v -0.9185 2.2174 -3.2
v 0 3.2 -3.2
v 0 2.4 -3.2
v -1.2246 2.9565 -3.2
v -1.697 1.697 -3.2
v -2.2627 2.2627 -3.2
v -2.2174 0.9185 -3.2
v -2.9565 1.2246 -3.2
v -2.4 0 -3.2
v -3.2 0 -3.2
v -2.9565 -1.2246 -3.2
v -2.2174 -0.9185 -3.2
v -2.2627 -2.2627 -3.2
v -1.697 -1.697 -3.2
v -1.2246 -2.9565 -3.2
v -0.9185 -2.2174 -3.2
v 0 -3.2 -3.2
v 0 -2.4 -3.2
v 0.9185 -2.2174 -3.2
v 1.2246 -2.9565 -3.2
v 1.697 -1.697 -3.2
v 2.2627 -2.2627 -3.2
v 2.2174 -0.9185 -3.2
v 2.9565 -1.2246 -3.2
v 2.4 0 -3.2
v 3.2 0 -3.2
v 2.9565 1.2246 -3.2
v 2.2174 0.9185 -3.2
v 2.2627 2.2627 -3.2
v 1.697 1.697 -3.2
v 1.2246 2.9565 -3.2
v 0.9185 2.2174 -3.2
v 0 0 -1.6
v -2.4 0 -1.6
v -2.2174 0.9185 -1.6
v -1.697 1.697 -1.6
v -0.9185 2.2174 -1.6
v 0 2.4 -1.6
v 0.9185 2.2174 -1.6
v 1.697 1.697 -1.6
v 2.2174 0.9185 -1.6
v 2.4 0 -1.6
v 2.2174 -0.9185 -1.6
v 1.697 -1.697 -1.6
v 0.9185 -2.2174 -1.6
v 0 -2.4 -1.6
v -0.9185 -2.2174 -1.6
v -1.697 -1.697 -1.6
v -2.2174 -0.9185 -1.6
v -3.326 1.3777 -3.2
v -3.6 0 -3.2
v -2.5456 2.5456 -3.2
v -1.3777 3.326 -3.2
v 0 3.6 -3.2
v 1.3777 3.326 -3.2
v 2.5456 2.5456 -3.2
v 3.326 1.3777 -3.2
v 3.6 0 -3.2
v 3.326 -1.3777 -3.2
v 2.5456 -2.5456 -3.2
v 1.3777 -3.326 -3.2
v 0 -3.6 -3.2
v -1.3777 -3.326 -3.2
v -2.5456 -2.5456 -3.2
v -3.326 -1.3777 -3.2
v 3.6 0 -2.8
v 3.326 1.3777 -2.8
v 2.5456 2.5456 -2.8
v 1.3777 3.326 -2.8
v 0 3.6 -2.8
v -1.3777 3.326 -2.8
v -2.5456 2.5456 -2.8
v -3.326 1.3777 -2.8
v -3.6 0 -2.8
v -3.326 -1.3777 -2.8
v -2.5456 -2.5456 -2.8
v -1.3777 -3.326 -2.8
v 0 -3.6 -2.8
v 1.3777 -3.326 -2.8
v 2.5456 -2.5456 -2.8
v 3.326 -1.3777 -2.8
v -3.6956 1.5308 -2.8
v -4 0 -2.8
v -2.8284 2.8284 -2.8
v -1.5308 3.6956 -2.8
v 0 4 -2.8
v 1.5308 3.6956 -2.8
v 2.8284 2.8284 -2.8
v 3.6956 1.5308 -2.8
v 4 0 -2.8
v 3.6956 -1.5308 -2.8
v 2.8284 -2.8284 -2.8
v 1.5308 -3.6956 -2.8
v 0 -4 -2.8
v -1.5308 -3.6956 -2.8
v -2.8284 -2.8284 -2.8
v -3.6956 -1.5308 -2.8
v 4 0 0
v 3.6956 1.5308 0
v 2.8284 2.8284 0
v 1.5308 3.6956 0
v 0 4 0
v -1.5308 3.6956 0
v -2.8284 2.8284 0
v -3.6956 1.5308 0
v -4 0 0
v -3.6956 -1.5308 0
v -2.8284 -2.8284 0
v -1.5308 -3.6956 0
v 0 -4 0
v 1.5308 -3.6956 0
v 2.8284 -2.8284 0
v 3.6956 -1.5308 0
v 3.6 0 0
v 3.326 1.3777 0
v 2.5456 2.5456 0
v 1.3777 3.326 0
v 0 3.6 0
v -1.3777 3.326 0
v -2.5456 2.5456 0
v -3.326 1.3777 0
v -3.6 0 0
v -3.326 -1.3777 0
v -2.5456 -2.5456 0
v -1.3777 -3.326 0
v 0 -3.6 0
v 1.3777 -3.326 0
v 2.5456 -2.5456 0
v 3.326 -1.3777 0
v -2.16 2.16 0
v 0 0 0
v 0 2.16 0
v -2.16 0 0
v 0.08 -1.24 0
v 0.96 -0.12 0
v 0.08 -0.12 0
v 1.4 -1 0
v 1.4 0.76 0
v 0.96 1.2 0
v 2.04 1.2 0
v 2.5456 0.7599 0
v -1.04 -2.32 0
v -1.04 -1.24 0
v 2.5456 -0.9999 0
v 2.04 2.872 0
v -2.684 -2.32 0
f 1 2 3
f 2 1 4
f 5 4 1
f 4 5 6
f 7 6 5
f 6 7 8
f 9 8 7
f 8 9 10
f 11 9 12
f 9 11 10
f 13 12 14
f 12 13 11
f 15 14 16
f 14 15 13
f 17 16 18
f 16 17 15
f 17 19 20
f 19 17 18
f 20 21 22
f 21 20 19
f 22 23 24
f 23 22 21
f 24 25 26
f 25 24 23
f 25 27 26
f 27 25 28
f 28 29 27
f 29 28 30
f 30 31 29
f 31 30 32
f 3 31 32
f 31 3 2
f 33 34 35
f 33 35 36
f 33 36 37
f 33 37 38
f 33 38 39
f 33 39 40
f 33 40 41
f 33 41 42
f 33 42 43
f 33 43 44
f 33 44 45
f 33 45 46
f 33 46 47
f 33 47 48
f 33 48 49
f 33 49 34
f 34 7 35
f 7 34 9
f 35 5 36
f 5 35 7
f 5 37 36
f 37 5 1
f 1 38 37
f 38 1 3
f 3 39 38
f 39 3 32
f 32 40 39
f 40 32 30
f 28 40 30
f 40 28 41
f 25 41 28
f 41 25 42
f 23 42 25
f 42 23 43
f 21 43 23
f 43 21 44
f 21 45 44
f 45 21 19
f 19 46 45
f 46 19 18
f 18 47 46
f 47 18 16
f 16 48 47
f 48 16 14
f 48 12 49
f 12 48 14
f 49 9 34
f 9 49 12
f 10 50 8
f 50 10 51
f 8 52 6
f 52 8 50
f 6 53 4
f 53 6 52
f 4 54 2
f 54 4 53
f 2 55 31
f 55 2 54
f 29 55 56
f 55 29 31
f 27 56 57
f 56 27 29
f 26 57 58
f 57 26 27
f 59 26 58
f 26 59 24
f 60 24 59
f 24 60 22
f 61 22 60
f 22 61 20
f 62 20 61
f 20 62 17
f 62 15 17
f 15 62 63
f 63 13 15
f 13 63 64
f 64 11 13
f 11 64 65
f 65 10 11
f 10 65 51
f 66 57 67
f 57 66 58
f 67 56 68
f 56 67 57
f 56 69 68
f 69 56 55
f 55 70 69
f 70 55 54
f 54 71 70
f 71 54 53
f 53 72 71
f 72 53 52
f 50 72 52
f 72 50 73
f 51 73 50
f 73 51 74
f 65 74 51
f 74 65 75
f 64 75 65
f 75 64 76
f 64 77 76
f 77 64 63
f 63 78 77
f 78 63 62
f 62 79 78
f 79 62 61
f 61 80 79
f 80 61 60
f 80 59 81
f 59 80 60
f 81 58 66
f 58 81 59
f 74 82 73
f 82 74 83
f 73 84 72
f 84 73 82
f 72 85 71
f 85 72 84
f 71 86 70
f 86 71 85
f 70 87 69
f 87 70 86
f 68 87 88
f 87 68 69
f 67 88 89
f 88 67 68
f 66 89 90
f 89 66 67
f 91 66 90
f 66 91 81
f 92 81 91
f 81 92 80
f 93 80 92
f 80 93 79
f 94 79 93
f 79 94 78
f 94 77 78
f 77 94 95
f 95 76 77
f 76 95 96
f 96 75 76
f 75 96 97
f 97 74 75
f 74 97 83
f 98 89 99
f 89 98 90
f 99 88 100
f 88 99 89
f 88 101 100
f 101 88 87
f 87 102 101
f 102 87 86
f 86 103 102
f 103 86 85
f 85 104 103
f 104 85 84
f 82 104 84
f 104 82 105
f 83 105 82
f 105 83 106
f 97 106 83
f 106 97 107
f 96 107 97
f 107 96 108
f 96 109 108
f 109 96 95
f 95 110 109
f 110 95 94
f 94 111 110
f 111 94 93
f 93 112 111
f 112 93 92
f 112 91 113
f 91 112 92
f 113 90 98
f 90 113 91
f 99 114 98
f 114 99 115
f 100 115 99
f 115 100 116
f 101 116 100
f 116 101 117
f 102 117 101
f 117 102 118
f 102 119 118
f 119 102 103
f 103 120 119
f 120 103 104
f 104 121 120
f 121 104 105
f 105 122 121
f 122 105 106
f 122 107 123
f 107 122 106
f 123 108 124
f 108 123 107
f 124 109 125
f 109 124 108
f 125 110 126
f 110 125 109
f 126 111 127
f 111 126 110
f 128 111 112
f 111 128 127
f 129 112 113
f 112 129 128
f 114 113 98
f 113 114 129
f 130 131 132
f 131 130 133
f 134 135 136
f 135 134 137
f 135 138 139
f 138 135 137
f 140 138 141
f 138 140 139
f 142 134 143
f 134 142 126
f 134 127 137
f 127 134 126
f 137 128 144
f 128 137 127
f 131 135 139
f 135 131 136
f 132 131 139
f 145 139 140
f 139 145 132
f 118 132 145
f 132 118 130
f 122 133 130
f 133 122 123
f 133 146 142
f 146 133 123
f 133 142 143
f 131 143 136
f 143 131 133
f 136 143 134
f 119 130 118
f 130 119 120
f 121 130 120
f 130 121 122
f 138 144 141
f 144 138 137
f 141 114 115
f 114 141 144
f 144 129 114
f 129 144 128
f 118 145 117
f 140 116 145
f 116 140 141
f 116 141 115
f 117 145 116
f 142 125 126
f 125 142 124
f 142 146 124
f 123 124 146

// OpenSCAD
// file: ../p/4-4disc.scad
use <../lib.scad>
function ldraw_lib__4_4disc() = [
// 0 Disc 1.0
// 0 Name: 4-4disc.dat
// 0 Author: James Jessiman
// 0 !LDRAW_ORG Primitive UPDATE 2002-02
// 0 !LICENSE Licensed under CC BY 4.0 : see CAreadme.txt
// 
// 0 BFC CERTIFY CCW
  [0,"BFC","CERTIFY"],
  [0,"BFC","CCW"],
// 
// 0 !HISTORY 1998-12-15 [PTadmin] Official Update 1998-10
// 0 !HISTORY 2002-03-23 [sbliss] Added BFC statement
// 0 !HISTORY 2002-04-25 [PTadmin] Official Update 2002-02
// 0 !HISTORY 2007-06-24 [PTadmin] Header formatted for Contributor Agreement
// 0 !HISTORY 2008-07-01 [PTadmin] Official Update 2008-01
// 
// 
// 3 16 0 0 0 1 0 0 0.9239 0 0.3827
  [3,16,0,0,0,1,0,0,0.9239,0,0.3827],
// 3 16 0 0 0 0.9239 0 0.3827 0.7071 0 0.7071
  [3,16,0,0,0,0.9239,0,0.3827,0.7071,0,0.7071],
// 3 16 0 0 0 0.7071 0 0.7071 0.3827 0 0.9239
  [3,16,0,0,0,0.7071,0,0.7071,0.3827,0,0.9239],
// 3 16 0 0 0 0.3827 0 0.9239 0 0 1
  [3,16,0,0,0,0.3827,0,0.9239,0,0,1],
// 3 16 0 0 0 0 0 1 -0.3827 0 0.9239
  [3,16,0,0,0,0,0,1,-0.3827,0,0.9239],
// 3 16 0 0 0 -0.3827 0 0.9239 -0.7071 0 0.7071
  [3,16,0,0,0,-0.3827,0,0.9239,-0.7071,0,0.7071],
// 3 16 0 0 0 -0.7071 0 0.7071 -0.9239 0 0.3827
  [3,16,0,0,0,-0.7071,0,0.7071,-0.9239,0,0.3827],
// 3 16 0 0 0 -0.9239 0 0.3827 -1 0 -0
  [3,16,0,0,0,-0.9239,0,0.3827,-1,0,-0],
// 3 16 0 0 0 -1 0 -0 -0.9239 0 -0.3827
  [3,16,0,0,0,-1,0,-0,-0.9239,0,-0.3827],
// 3 16 0 0 0 -0.9239 0 -0.3827 -0.7071 0 -0.7071
  [3,16,0,0,0,-0.9239,0,-0.3827,-0.7071,0,-0.7071],
// 3 16 0 0 0 -0.7071 0 -0.7071 -0.3827 0 -0.9239
  [3,16,0,0,0,-0.7071,0,-0.7071,-0.3827,0,-0.9239],
// 3 16 0 0 0 -0.3827 0 -0.9239 0 0 -1
  [3,16,0,0,0,-0.3827,0,-0.9239,0,0,-1],
// 3 16 0 0 0 0 0 -1 0.3827 0 -0.9239
  [3,16,0,0,0,0,0,-1,0.3827,0,-0.9239],
// 3 16 0 0 0 0.3827 0 -0.9239 0.7071 0 -0.7071
  [3,16,0,0,0,0.3827,0,-0.9239,0.7071,0,-0.7071],
// 3 16 0 0 0 0.7071 0 -0.7071 0.9239 0 -0.3827
  [3,16,0,0,0,0.7071,0,-0.7071,0.9239,0,-0.3827],
// 3 16 0 0 0 0.9239 0 -0.3827 1 0 0
  [3,16,0,0,0,0.9239,0,-0.3827,1,0,0],
// 0
];
module ldraw_lib__4_4disc(step=0, col=false, unit=2/5, alt=false, line=0.2, solid=!$preview)
    makepoly(ldraw_lib__4_4disc(), step=step, col=col, unit=unit, alt=alt, line=line, solid=solid);
ldraw_lib__4_4disc(line=0.2);
// file: ../p/4-4ring3.scad
use <../lib.scad>
function ldraw_lib__4_4ring3() = [
// 0 Ring  3 x 1.0
// 0 Name: 4-4ring3.dat
// 0 Author: James Jessiman
// 0 !LDRAW_ORG Primitive UPDATE 2009-01
// 0 !LICENSE Licensed under CC BY 2.0 and CC BY 4.0 : see CAreadme.txt
// 
// 0 BFC CERTIFY CCW
  [0,"BFC","CERTIFY"],
  [0,"BFC","CCW"],
// 
// 0 !HISTORY 1998-12-15 [PTadmin] Official Update 1998-10
// 0 !HISTORY 2002-04-05 [hafhead] Added BFC statement
// 0 !HISTORY 2002-04-25 [PTadmin] Official Update 2002-02
// 0 !HISTORY 2007-06-24 [PTadmin] Header formatted for Contributor Agreement
// 0 !HISTORY 2008-07-01 [PTadmin] Official Update 2008-01
// 0 !HISTORY 2008-08-26 [cwdee] Switch polygon winding and rename
// 0 !HISTORY 2009-05-02 [PTadmin] Official Update 2009-01
// 
// 
// 4 16 -1.5308 0 3.6956 -1.1481 0 2.7717 0 0 3 0 0 4
  [4,16,-1.5308,0,3.6956,-1.1481,0,2.7717,0,0,3,0,0,4],
// 4 16 -2.8284 0 2.8284 -2.1213 0 2.1213 -1.1481 0 2.7717 -1.5308 0 3.6956
  [4,16,-2.8284,0,2.8284,-2.1213,0,2.1213,-1.1481,0,2.7717,-1.5308,0,3.6956],
// 4 16 -3.6956 0 1.5308 -2.7717 0 1.1481 -2.1213 0 2.1213 -2.8284 0 2.8284
  [4,16,-3.6956,0,1.5308,-2.7717,0,1.1481,-2.1213,0,2.1213,-2.8284,0,2.8284],
// 4 16 -4 0 0 -3 0 0 -2.7717 0 1.1481 -3.6956 0 1.5308
  [4,16,-4,0,0,-3,0,0,-2.7717,0,1.1481,-3.6956,0,1.5308],
// 4 16 -3.6956 0 -1.5308 -2.7717 0 -1.1481 -3 0 0 -4 0 0
  [4,16,-3.6956,0,-1.5308,-2.7717,0,-1.1481,-3,0,0,-4,0,0],
// 4 16 -2.8284 0 -2.8284 -2.1213 0 -2.1213 -2.7717 0 -1.1481 -3.6956 0 -1.5308
  [4,16,-2.8284,0,-2.8284,-2.1213,0,-2.1213,-2.7717,0,-1.1481,-3.6956,0,-1.5308],
// 4 16 -1.5308 0 -3.6956 -1.1481 0 -2.7717 -2.1213 0 -2.1213 -2.8284 0 -2.8284
  [4,16,-1.5308,0,-3.6956,-1.1481,0,-2.7717,-2.1213,0,-2.1213,-2.8284,0,-2.8284],
// 4 16 0 0 -4 0 0 -3 -1.1481 0 -2.7717 -1.5308 0 -3.6956
  [4,16,0,0,-4,0,0,-3,-1.1481,0,-2.7717,-1.5308,0,-3.6956],
// 4 16 1.5308 0 -3.6956 1.1481 0 -2.7717 0 0 -3 0 0 -4
  [4,16,1.5308,0,-3.6956,1.1481,0,-2.7717,0,0,-3,0,0,-4],
// 4 16 2.8284 0 -2.8284 2.1213 0 -2.1213 1.1481 0 -2.7717 1.5308 0 -3.6956
  [4,16,2.8284,0,-2.8284,2.1213,0,-2.1213,1.1481,0,-2.7717,1.5308,0,-3.6956],
// 4 16 3.6956 0 -1.5308 2.7717 0 -1.1481 2.1213 0 -2.1213 2.8284 0 -2.8284
  [4,16,3.6956,0,-1.5308,2.7717,0,-1.1481,2.1213,0,-2.1213,2.8284,0,-2.8284],
// 4 16 4 0 0 3 0 0 2.7717 0 -1.1481 3.6956 0 -1.5308
  [4,16,4,0,0,3,0,0,2.7717,0,-1.1481,3.6956,0,-1.5308],
// 4 16 3.6956 0 1.5308 2.7717 0 1.1481 3 0 0 4 0 0
  [4,16,3.6956,0,1.5308,2.7717,0,1.1481,3,0,0,4,0,0],
// 4 16 2.8284 0 2.8284 2.1213 0 2.1213 2.7717 0 1.1481 3.6956 0 1.5308
  [4,16,2.8284,0,2.8284,2.1213,0,2.1213,2.7717,0,1.1481,3.6956,0,1.5308],
// 4 16 1.5308 0 3.6956 1.1481 0 2.7717 2.1213 0 2.1213 2.8284 0 2.8284
  [4,16,1.5308,0,3.6956,1.1481,0,2.7717,2.1213,0,2.1213,2.8284,0,2.8284],
// 4 16 0 0 4 0 0 3 1.1481 0 2.7717 1.5308 0 3.6956
  [4,16,0,0,4,0,0,3,1.1481,0,2.7717,1.5308,0,3.6956],
// 0
];
module ldraw_lib__4_4ring3(step=0, col=false, unit=2/5, alt=false, line=0.2, solid=!$preview)
    makepoly(ldraw_lib__4_4ring3(), step=step, col=col, unit=unit, alt=alt, line=line, solid=solid);
ldraw_lib__4_4ring3(line=0.2);
// file: ../p/4-4cylc.scad
use <../lib.scad>
use <4-4cyli.scad>
use <4-4disc.scad>
use <4-4edge.scad>
function ldraw_lib__4_4cylc() = [
// 0 Cylinder Closed 1.0
// 0 Name: 4-4cylc.dat
// 0 Author: Alex Taylor [anathema]
// 0 !LDRAW_ORG Primitive UPDATE 2009-02
// 0 !LICENSE Licensed under CC BY 2.0 and CC BY 4.0 : see CAreadme.txt
// 
// 0 BFC CERTIFY CCW
  [0,"BFC","CERTIFY"],
  [0,"BFC","CCW"],
// 
// 0 !HISTORY 2008-12-29 [cwdee] Removed one disc
// 0 !HISTORY 2009-09-03 [PTadmin] Official Update 2009-02
// 
// 
// 1 16 0 0 0 1 0 0 0 1 0 0 0 1 4-4edge.dat
  [1,16,0,0,0,1,0,0,0,1,0,0,0,1, ldraw_lib__4_4edge()],
// 1 16 0 1 0 1 0 0 0 1 0 0 0 1 4-4edge.dat
  [1,16,0,1,0,1,0,0,0,1,0,0,0,1, ldraw_lib__4_4edge()],
// 1 16 0 0 0 1 0 0 0 1 0 0 0 1 4-4disc.dat
  [1,16,0,0,0,1,0,0,0,1,0,0,0,1, ldraw_lib__4_4disc()],
// 1 16 0 0 0 1 0 0 0 1 0 0 0 1 4-4cyli.dat
  [1,16,0,0,0,1,0,0,0,1,0,0,0,1, ldraw_lib__4_4cyli()],
// 0
];
module ldraw_lib__4_4cylc(step=0, col=false, unit=2/5, alt=false, line=0.2, solid=!$preview)
    makepoly(ldraw_lib__4_4cylc(), step=step, col=col, unit=unit, alt=alt, line=line, solid=solid);
ldraw_lib__4_4cylc(line=0.2);
// file: ../p/4-4edge.scad
use <../lib.scad>
function ldraw_lib__4_4edge() = [
// 0 Circle 1.0
// 0 Name: 4-4edge.dat
// 0 Author: James Jessiman
// 0 !LDRAW_ORG Primitive UPDATE 2017-01
// 0 !LICENSE Licensed under CC BY 4.0 : see CAreadme.txt
// 
// 0 BFC CERTIFY CCW
  [0,"BFC","CERTIFY"],
  [0,"BFC","CCW"],
// 
// 0 !HISTORY 1998-12-15 [PTadmin] Official Update 1998-10
// 0 !HISTORY 2005-12-28 [PTadmin] Official Update 2005-01
// 0 !HISTORY 2007-06-24 [PTadmin] Header formatted for Contributor Agreement
// 0 !HISTORY 2008-07-01 [PTadmin] Official Update 2008-01
// 0 !HISTORY 2017-01-15 [Steffen] BFCed
// 0 !HISTORY 2017-12-30 [PTadmin] Official Update 2017-01
// 
// 
// 2 24 1 0 0 0.9239 0 0.3827
  [2,24,1,0,0,0.9239,0,0.3827],
// 2 24 0.9239 0 0.3827 0.7071 0 0.7071
  [2,24,0.9239,0,0.3827,0.7071,0,0.7071],
// 2 24 0.7071 0 0.7071 0.3827 0 0.9239
  [2,24,0.7071,0,0.7071,0.3827,0,0.9239],
// 2 24 0.3827 0 0.9239 0 0 1
  [2,24,0.3827,0,0.9239,0,0,1],
// 2 24 0 0 1 -0.3827 0 0.9239
  [2,24,0,0,1,-0.3827,0,0.9239],
// 2 24 -0.3827 0 0.9239 -0.7071 0 0.7071
  [2,24,-0.3827,0,0.9239,-0.7071,0,0.7071],
// 2 24 -0.7071 0 0.7071 -0.9239 0 0.3827
  [2,24,-0.7071,0,0.7071,-0.9239,0,0.3827],
// 2 24 -0.9239 0 0.3827 -1 0 -0
  [2,24,-0.9239,0,0.3827,-1,0,-0],
// 2 24 -1 0 -0 -0.9239 0 -0.3827
  [2,24,-1,0,-0,-0.9239,0,-0.3827],
// 2 24 -0.9239 0 -0.3827 -0.7071 0 -0.7071
  [2,24,-0.9239,0,-0.3827,-0.7071,0,-0.7071],
// 2 24 -0.7071 0 -0.7071 -0.3827 0 -0.9239
  [2,24,-0.7071,0,-0.7071,-0.3827,0,-0.9239],
// 2 24 -0.3827 0 -0.9239 0 0 -1
  [2,24,-0.3827,0,-0.9239,0,0,-1],
// 2 24 0 0 -1 0.3827 0 -0.9239
  [2,24,0,0,-1,0.3827,0,-0.9239],
// 2 24 0.3827 0 -0.9239 0.7071 0 -0.7071
  [2,24,0.3827,0,-0.9239,0.7071,0,-0.7071],
// 2 24 0.7071 0 -0.7071 0.9239 0 -0.3827
  [2,24,0.7071,0,-0.7071,0.9239,0,-0.3827],
// 2 24 0.9239 0 -0.3827 1 0 0
  [2,24,0.9239,0,-0.3827,1,0,0],
];
module ldraw_lib__4_4edge(step=0, col=false, unit=2/5, alt=false, line=0.2, solid=!$preview)
    makepoly(ldraw_lib__4_4edge(), step=step, col=col, unit=unit, alt=alt, line=line, solid=solid);
ldraw_lib__4_4edge(line=0.2);
// file: ../p/4-4cyli.scad
use <../lib.scad>
function ldraw_lib__4_4cyli() = [
// 0 Cylinder 1.0
// 0 Name: 4-4cyli.dat
// 0 Author: James Jessiman
// 0 !LDRAW_ORG Primitive UPDATE 2005-01
// 0 !LICENSE Licensed under CC BY 2.0 and CC BY 4.0 : see CAreadme.txt
// 
// 0 BFC CERTIFY CCW
  [0,"BFC","CERTIFY"],
  [0,"BFC","CCW"],
// 
// 0 !HISTORY 1998-12-15 [PTadmin] Official Update 1998-10
// 0 !HISTORY 2002-03-23 [sbliss] Added BFC statement; merged headers from files in distributions LDraw 0.27 and Complete.
// 0 !HISTORY 2002-04-25 [PTadmin] Official Update 2002-02
// 0 !HISTORY 2004-12-14 [guyvivan] BFC CCW
// 0 !HISTORY 2005-12-28 [PTadmin] Official Update 2005-01
// 0 !HISTORY 2007-06-24 [PTadmin] Header formatted for Contributor Agreement
// 0 !HISTORY 2008-07-01 [PTadmin] Official Update 2008-01
// 
// 
// 4 16 1 1 0 0.9239 1 0.3827 0.9239 0 0.3827 1 0 0
  [4,16,1,1,0,0.9239,1,0.3827,0.9239,0,0.3827,1,0,0],
// 5 24 1 0 0 1 1 0 0.9239 0 0.3827 0.9239 0 -0.3827
  [5,24,1,0,0,1,1,0,0.9239,0,0.3827,0.9239,0,-0.3827],
// 4 16 0.9239 1 0.3827 0.7071 1 0.7071 0.7071 0 0.7071 0.9239 0 0.3827
  [4,16,0.9239,1,0.3827,0.7071,1,0.7071,0.7071,0,0.7071,0.9239,0,0.3827],
// 5 24 0.9239 0 0.3827 0.9239 1 0.3827 0.7071 0 0.7071 1 0 0
  [5,24,0.9239,0,0.3827,0.9239,1,0.3827,0.7071,0,0.7071,1,0,0],
// 4 16 0.7071 1 0.7071 0.3827 1 0.9239 0.3827 0 0.9239 0.7071 0 0.7071
  [4,16,0.7071,1,0.7071,0.3827,1,0.9239,0.3827,0,0.9239,0.7071,0,0.7071],
// 5 24 0.7071 0 0.7071 0.7071 1 0.7071 0.3827 0 0.9239 0.9239 0 0.3827
  [5,24,0.7071,0,0.7071,0.7071,1,0.7071,0.3827,0,0.9239,0.9239,0,0.3827],
// 4 16 0.3827 1 0.9239 0 1 1 0 0 1 0.3827 0 0.9239
  [4,16,0.3827,1,0.9239,0,1,1,0,0,1,0.3827,0,0.9239],
// 5 24 0.3827 0 0.9239 0.3827 1 0.9239 0 0 1 0.7071 0 0.7071
  [5,24,0.3827,0,0.9239,0.3827,1,0.9239,0,0,1,0.7071,0,0.7071],
// 4 16 0 1 1 -0.3827 1 0.9239 -0.3827 0 0.9239 0 0 1
  [4,16,0,1,1,-0.3827,1,0.9239,-0.3827,0,0.9239,0,0,1],
// 5 24 0 0 1 0 1 1 -0.3827 0 0.9239 0.3827 0 0.9239
  [5,24,0,0,1,0,1,1,-0.3827,0,0.9239,0.3827,0,0.9239],
// 4 16 -0.3827 1 0.9239 -0.7071 1 0.7071 -0.7071 0 0.7071 -0.3827 0 0.9239
  [4,16,-0.3827,1,0.9239,-0.7071,1,0.7071,-0.7071,0,0.7071,-0.3827,0,0.9239],
// 5 24 -0.3827 0 0.9239 -0.3827 1 0.9239 -0.7071 0 0.7071 0 0 1
  [5,24,-0.3827,0,0.9239,-0.3827,1,0.9239,-0.7071,0,0.7071,0,0,1],
// 4 16 -0.7071 1 0.7071 -0.9239 1 0.3827 -0.9239 0 0.3827 -0.7071 0 0.7071
  [4,16,-0.7071,1,0.7071,-0.9239,1,0.3827,-0.9239,0,0.3827,-0.7071,0,0.7071],
// 5 24 -0.7071 0 0.7071 -0.7071 1 0.7071 -0.9239 0 0.3827 -0.3827 0 0.9239
  [5,24,-0.7071,0,0.7071,-0.7071,1,0.7071,-0.9239,0,0.3827,-0.3827,0,0.9239],
// 4 16 -0.9239 1 0.3827 -1 1 0 -1 0 0 -0.9239 0 0.3827
  [4,16,-0.9239,1,0.3827,-1,1,0,-1,0,0,-0.9239,0,0.3827],
// 5 24 -0.9239 0 0.3827 -0.9239 1 0.3827 -1 0 0 -0.7071 0 0.7071
  [5,24,-0.9239,0,0.3827,-0.9239,1,0.3827,-1,0,0,-0.7071,0,0.7071],
// 4 16 -1 1 0 -0.9239 1 -0.3827 -0.9239 0 -0.3827 -1 0 0
  [4,16,-1,1,0,-0.9239,1,-0.3827,-0.9239,0,-0.3827,-1,0,0],
// 5 24 -1 0 0 -1 1 0 -0.9239 0 -0.3827 -0.9239 0 0.3827
  [5,24,-1,0,0,-1,1,0,-0.9239,0,-0.3827,-0.9239,0,0.3827],
// 4 16 -0.9239 1 -0.3827 -0.7071 1 -0.7071 -0.7071 0 -0.7071 -0.9239 0 -0.3827
  [4,16,-0.9239,1,-0.3827,-0.7071,1,-0.7071,-0.7071,0,-0.7071,-0.9239,0,-0.3827],
// 5 24 -0.9239 0 -0.3827 -0.9239 1 -0.3827 -0.7071 0 -0.7071 -1 0 0
  [5,24,-0.9239,0,-0.3827,-0.9239,1,-0.3827,-0.7071,0,-0.7071,-1,0,0],
// 4 16 -0.7071 1 -0.7071 -0.3827 1 -0.9239 -0.3827 0 -0.9239 -0.7071 0 -0.7071
  [4,16,-0.7071,1,-0.7071,-0.3827,1,-0.9239,-0.3827,0,-0.9239,-0.7071,0,-0.7071],
// 5 24 -0.7071 0 -0.7071 -0.7071 1 -0.7071 -0.3827 0 -0.9239 -0.9239 0 -0.3827
  [5,24,-0.7071,0,-0.7071,-0.7071,1,-0.7071,-0.3827,0,-0.9239,-0.9239,0,-0.3827],
// 4 16 -0.3827 1 -0.9239 0 1 -1 0 0 -1 -0.3827 0 -0.9239
  [4,16,-0.3827,1,-0.9239,0,1,-1,0,0,-1,-0.3827,0,-0.9239],
// 5 24 -0.3827 0 -0.9239 -0.3827 1 -0.9239 0 0 -1 -0.7071 0 -0.7071
  [5,24,-0.3827,0,-0.9239,-0.3827,1,-0.9239,0,0,-1,-0.7071,0,-0.7071],
// 4 16 0 1 -1 0.3827 1 -0.9239 0.3827 0 -0.9239 0 0 -1
  [4,16,0,1,-1,0.3827,1,-0.9239,0.3827,0,-0.9239,0,0,-1],
// 5 24 0 0 -1 0 1 -1 0.3827 0 -0.9239 -0.3827 0 -0.9239
  [5,24,0,0,-1,0,1,-1,0.3827,0,-0.9239,-0.3827,0,-0.9239],
// 4 16 0.3827 1 -0.9239 0.7071 1 -0.7071 0.7071 0 -0.7071 0.3827 0 -0.9239
  [4,16,0.3827,1,-0.9239,0.7071,1,-0.7071,0.7071,0,-0.7071,0.3827,0,-0.9239],
// 5 24 0.3827 0 -0.9239 0.3827 1 -0.9239 0.7071 0 -0.7071 0 0 -1
  [5,24,0.3827,0,-0.9239,0.3827,1,-0.9239,0.7071,0,-0.7071,0,0,-1],
// 4 16 0.7071 1 -0.7071 0.9239 1 -0.3827 0.9239 0 -0.3827 0.7071 0 -0.7071
  [4,16,0.7071,1,-0.7071,0.9239,1,-0.3827,0.9239,0,-0.3827,0.7071,0,-0.7071],
// 5 24 0.7071 0 -0.7071 0.7071 1 -0.7071 0.9239 0 -0.3827 0.3827 0 -0.9239
  [5,24,0.7071,0,-0.7071,0.7071,1,-0.7071,0.9239,0,-0.3827,0.3827,0,-0.9239],
// 4 16 0.9239 1 -0.3827 1 1 0 1 0 0 0.9239 0 -0.3827
  [4,16,0.9239,1,-0.3827,1,1,0,1,0,0,0.9239,0,-0.3827],
// 5 24 0.9239 0 -0.3827 0.9239 1 -0.3827 1 0 0 0.7071 0 -0.7071
  [5,24,0.9239,0,-0.3827,0.9239,1,-0.3827,1,0,0,0.7071,0,-0.7071],
// 0
];
module ldraw_lib__4_4cyli(step=0, col=false, unit=2/5, alt=false, line=0.2, solid=!$preview)
    makepoly(ldraw_lib__4_4cyli(), step=step, col=col, unit=unit, alt=alt, line=line, solid=solid);
ldraw_lib__4_4cyli(line=0.2);
// file: ../p/stud4o.scad
use <../lib.scad>
use <4-4cylc.scad>
use <4-4ring3.scad>
function ldraw_lib__stud4o() = [
// 0 Stud Tube Open without Outer Cylinder
// 0 Name: stud4o.dat
// 0 Author: Magnus Forsberg [MagFors]
// 0 !LDRAW_ORG Primitive UPDATE 2011-02
// 0 !LICENSE Licensed under CC BY 4.0 : see CAreadme.txt
// 
// 0 !HELP This stud is a "antistud" to be used like a underside stud,
// 0 !HELP but without the outer cylinder.
// 0 !HELP 1 47 0 0 0 1 0 0 0 1 0 0 0 1 stud4.dat
// 
// 0 BFC CERTIFY CCW
  [0,"BFC","CERTIFY"],
  [0,"BFC","CCW"],
// 
// 0 !HISTORY 2011-12-29 [PTadmin] Official Update 2011-02
// 
// 
// 1 16 0 -4 0 2 0 0 0 1 0 0 0 2 4-4ring3.dat
  [1,16,0,-4,0,2,0,0,0,1,0,0,0,2, ldraw_lib__4_4ring3()],
// 0 BFC INVERTNEXT
  [0,"BFC","INVERTNEXT"],
// 1 16 0 0 0 -6 0 0 0 -4 0 0 0 6 4-4cylc.dat
  [1,16,0,0,0,-6,0,0,0,-4,0,0,0,6, ldraw_lib__4_4cylc()],
];
module ldraw_lib__stud4o(step=0, col=false, unit=2/5, alt=false, line=0.2, solid=!$preview)
    makepoly(ldraw_lib__stud4o(), step=step, col=col, unit=unit, alt=alt, line=line, solid=solid);
ldraw_lib__stud4o(line=0.2);
// file: ../p/4-4ring8.scad
use <../lib.scad>
function ldraw_lib__4_4ring8() = [
// 0 Ring  8 x 1.0
// 0 Name: 4-4ring8.dat
// 0 Author: Steffen [Steffen]
// 0 !LDRAW_ORG Primitive UPDATE 2012-01
// 0 !LICENSE Licensed under CC BY 4.0 : see CAreadme.txt
// 
// 0 BFC CERTIFY CCW
  [0,"BFC","CERTIFY"],
  [0,"BFC","CCW"],
// 
// 0 !HISTORY 2003-12-19 [PTadmin] Official Update 2003-03
// 0 !HISTORY 2007-06-24 [PTadmin] Header formatted for Contributor Agreement
// 0 !HISTORY 2008-07-01 [PTadmin] Official Update 2008-01
// 0 !HISTORY 2012-02-16 [Philo] Changed to CCW
// 0 !HISTORY 2012-03-30 [PTadmin] Official Update 2012-01
// 
// 
// 4 16 9 0 0 8.3151 0 3.4443 7.3912 0 3.0616 8 0 0
  [4,16,9,0,0,8.3151,0,3.4443,7.3912,0,3.0616,8,0,0],
// 4 16 8.3151 0 3.4443 6.3639 0 6.3639 5.6568 0 5.6568 7.3912 0 3.0616
  [4,16,8.3151,0,3.4443,6.3639,0,6.3639,5.6568,0,5.6568,7.3912,0,3.0616],
// 4 16 6.3639 0 6.3639 3.4443 0 8.3151 3.0616 0 7.3912 5.6568 0 5.6568
  [4,16,6.3639,0,6.3639,3.4443,0,8.3151,3.0616,0,7.3912,5.6568,0,5.6568],
// 4 16 3.4443 0 8.3151 0 0 9 0 0 8 3.0616 0 7.3912
  [4,16,3.4443,0,8.3151,0,0,9,0,0,8,3.0616,0,7.3912],
// 4 16 0 0 9 -3.4443 0 8.3151 -3.0616 0 7.3912 0 0 8
  [4,16,0,0,9,-3.4443,0,8.3151,-3.0616,0,7.3912,0,0,8],
// 4 16 -3.4443 0 8.3151 -6.3639 0 6.3639 -5.6568 0 5.6568 -3.0616 0 7.3912
  [4,16,-3.4443,0,8.3151,-6.3639,0,6.3639,-5.6568,0,5.6568,-3.0616,0,7.3912],
// 4 16 -6.3639 0 6.3639 -8.3151 0 3.4443 -7.3912 0 3.0616 -5.6568 0 5.6568
  [4,16,-6.3639,0,6.3639,-8.3151,0,3.4443,-7.3912,0,3.0616,-5.6568,0,5.6568],
// 4 16 -8.3151 0 3.4443 -9 0 0 -8 0 0 -7.3912 0 3.0616
  [4,16,-8.3151,0,3.4443,-9,0,0,-8,0,0,-7.3912,0,3.0616],
// 4 16 -9 0 0 -8.3151 0 -3.4443 -7.3912 0 -3.0616 -8 0 0
  [4,16,-9,0,0,-8.3151,0,-3.4443,-7.3912,0,-3.0616,-8,0,0],
// 4 16 -8.3151 0 -3.4443 -6.3639 0 -6.3639 -5.6568 0 -5.6568 -7.3912 0 -3.0616
  [4,16,-8.3151,0,-3.4443,-6.3639,0,-6.3639,-5.6568,0,-5.6568,-7.3912,0,-3.0616],
// 4 16 -6.3639 0 -6.3639 -3.4443 0 -8.3151 -3.0616 0 -7.3912 -5.6568 0 -5.6568
  [4,16,-6.3639,0,-6.3639,-3.4443,0,-8.3151,-3.0616,0,-7.3912,-5.6568,0,-5.6568],
// 4 16 -3.4443 0 -8.3151 0 0 -9 0 0 -8 -3.0616 0 -7.3912
  [4,16,-3.4443,0,-8.3151,0,0,-9,0,0,-8,-3.0616,0,-7.3912],
// 4 16 0 0 -9 3.4443 0 -8.3151 3.0616 0 -7.3912 0 0 -8
  [4,16,0,0,-9,3.4443,0,-8.3151,3.0616,0,-7.3912,0,0,-8],
// 4 16 3.4443 0 -8.3151 6.3639 0 -6.3639 5.6568 0 -5.6568 3.0616 0 -7.3912
  [4,16,3.4443,0,-8.3151,6.3639,0,-6.3639,5.6568,0,-5.6568,3.0616,0,-7.3912],
// 4 16 6.3639 0 -6.3639 8.3151 0 -3.4443 7.3912 0 -3.0616 5.6568 0 -5.6568
  [4,16,6.3639,0,-6.3639,8.3151,0,-3.4443,7.3912,0,-3.0616,5.6568,0,-5.6568],
// 4 16 8.3151 0 -3.4443 9 0 0 8 0 0 7.3912 0 -3.0616
  [4,16,8.3151,0,-3.4443,9,0,0,8,0,0,7.3912,0,-3.0616],
];
module ldraw_lib__4_4ring8(step=0, col=false, unit=2/5, alt=false, line=0.2, solid=!$preview)
    makepoly(ldraw_lib__4_4ring8(), step=step, col=col, unit=unit, alt=alt, line=line, solid=solid);
ldraw_lib__4_4ring8(line=0.2);
// file: ../p/4-4cylo.scad
use <../lib.scad>
use <4-4cyli.scad>
use <4-4edge.scad>
function ldraw_lib__4_4cylo() = [
// 0 Cylinder Open 1.0
// 0 Name: 4-4cylo.dat
// 0 Author: Mark Kennedy [mkennedy]
// 0 !LDRAW_ORG Primitive UPDATE 2010-01
// 0 !LICENSE Licensed under CC BY 4.0 : see CAreadme.txt
// 
// 0 BFC CERTIFY CCW
  [0,"BFC","CERTIFY"],
  [0,"BFC","CCW"],
// 
// 0 !HISTORY 2010-04-05 [PTadmin] Official Update 2010-01
// 
// 
// 1 16 0 0 0 1 0 0 0 1 0 0 0 1 4-4edge.dat
  [1,16,0,0,0,1,0,0,0,1,0,0,0,1, ldraw_lib__4_4edge()],
// 1 16 0 1 0 1 0 0 0 1 0 0 0 1 4-4edge.dat
  [1,16,0,1,0,1,0,0,0,1,0,0,0,1, ldraw_lib__4_4edge()],
// 1 16 0 0 0 1 0 0 0 1 0 0 0 1 4-4cyli.dat
  [1,16,0,0,0,1,0,0,0,1,0,0,0,1, ldraw_lib__4_4cyli()],
// 0
];
module ldraw_lib__4_4cylo(step=0, col=false, unit=2/5, alt=false, line=0.2, solid=!$preview)
    makepoly(ldraw_lib__4_4cylo(), step=step, col=col, unit=unit, alt=alt, line=line, solid=solid);
ldraw_lib__4_4cylo(line=0.2);
// file: s/98138s02.scad
use <../../lib.scad>
use <../../p/4-4cylo.scad>
use <../../p/4-4ring8.scad>
use <../../p/4-4ring9.scad>
use <../../p/stud4o.scad>
function ldraw_lib__s__98138s02() = [
// 0 ~Tile  1 x  1 Round with Groove without Complete Top Face
// 0 Name: s\98138s02.dat
// 0 Author: Magnus Forsberg [MagFors]
// 0 !LDRAW_ORG Subpart UPDATE 2020-01
// 0 !LICENSE Licensed under CC BY 4.0 : see CAreadme.txt
// 
// 0 BFC CERTIFY CCW
  [0,"BFC","CERTIFY"],
  [0,"BFC","CCW"],
// 
// 0 !HISTORY 2020-06-28 [PTadmin] Official Update 2020-01
// 
// 
// 1 16 0 4 0 1 0 0 0 -1 0 0 0 1 stud4o.dat
  [1,16,0,4,0,1,0,0,0,-1,0,0,0,1, ldraw_lib__stud4o()],
// 1 16 0 8 0 -1 0 0 0 -1 0 0 0 1 4-4ring8.dat
  [1,16,0,8,0,-1,0,0,0,-1,0,0,0,1, ldraw_lib__4_4ring8()],
// 1 16 0 7 0 9 0 0 0 1 0 0 0 9 4-4cylo.dat
  [1,16,0,7,0,9,0,0,0,1,0,0,0,9, ldraw_lib__4_4cylo()],
// 1 16 0 7 0 -1 0 0 0 -1 0 0 0 1 4-4ring9.dat
  [1,16,0,7,0,-1,0,0,0,-1,0,0,0,1, ldraw_lib__4_4ring9()],
// 1 16 0 0 0 10 0 0 0 7 0 0 0 10 4-4cylo.dat
  [1,16,0,0,0,10,0,0,0,7,0,0,0,10, ldraw_lib__4_4cylo()],
];
module ldraw_lib__s__98138s02(step=0, col=false, unit=2/5, alt=false, line=0.2, solid=!$preview)
    makepoly(ldraw_lib__s__98138s02(), step=step, col=col, unit=unit, alt=alt, line=line, solid=solid);
ldraw_lib__s__98138s02(line=0.2);
// file: ../p/4-4ring9.scad
use <../lib.scad>
function ldraw_lib__4_4ring9() = [
// 0 Ring  9 x 1.0
// 0 Name: 4-4ring9.dat
// 0 Author: John Riley [jriley]
// 0 !LDRAW_ORG Primitive UPDATE 2004-02
// 0 !LICENSE Licensed under CC BY 2.0 and CC BY 4.0 : see CAreadme.txt
// 
// 0 BFC CERTIFY CCW
  [0,"BFC","CERTIFY"],
  [0,"BFC","CCW"],
// 
// 0 !HISTORY 2004-04-22 [PTadmin] Official Update 2004-02
// 0 !HISTORY 2007-06-24 [PTadmin] Header formatted for Contributor Agreement
// 0 !HISTORY 2008-07-01 [PTadmin] Official Update 2008-01
// 
// 
// 4 16 9 0 0 10 0 0 9.239 0 3.827 8.3151 0 3.4443
  [4,16,9,0,0,10,0,0,9.239,0,3.827,8.3151,0,3.4443],
// 4 16 8.3151 0 3.4443 9.239 0 3.827 7.071 0 7.071 6.3639 0 6.3639
  [4,16,8.3151,0,3.4443,9.239,0,3.827,7.071,0,7.071,6.3639,0,6.3639],
// 4 16 6.3639 0 6.3639 7.071 0 7.071 3.827 0 9.239 3.4443 0 8.3151
  [4,16,6.3639,0,6.3639,7.071,0,7.071,3.827,0,9.239,3.4443,0,8.3151],
// 4 16 3.4443 0 8.3151 3.827 0 9.239 0 0 10 0 0 9
  [4,16,3.4443,0,8.3151,3.827,0,9.239,0,0,10,0,0,9],
// 4 16 0 0 9 0 0 10 -3.827 0 9.239 -3.4443 0 8.3151
  [4,16,0,0,9,0,0,10,-3.827,0,9.239,-3.4443,0,8.3151],
// 4 16 -3.4443 0 8.3151 -3.827 0 9.239 -7.071 0 7.071 -6.3639 0 6.3639
  [4,16,-3.4443,0,8.3151,-3.827,0,9.239,-7.071,0,7.071,-6.3639,0,6.3639],
// 4 16 -6.3639 0 6.3639 -7.071 0 7.071 -9.239 0 3.827 -8.3151 0 3.4443
  [4,16,-6.3639,0,6.3639,-7.071,0,7.071,-9.239,0,3.827,-8.3151,0,3.4443],
// 4 16 -8.3151 0 3.4443 -9.239 0 3.827 -10 0 0 -9 0 0
  [4,16,-8.3151,0,3.4443,-9.239,0,3.827,-10,0,0,-9,0,0],
// 4 16 -9 0 0 -10 0 0 -9.239 0 -3.827 -8.3151 0 -3.4443
  [4,16,-9,0,0,-10,0,0,-9.239,0,-3.827,-8.3151,0,-3.4443],
// 4 16 -8.3151 0 -3.4443 -9.239 0 -3.827 -7.071 0 -7.071 -6.3639 0 -6.3639
  [4,16,-8.3151,0,-3.4443,-9.239,0,-3.827,-7.071,0,-7.071,-6.3639,0,-6.3639],
// 4 16 -6.3639 0 -6.3639 -7.071 0 -7.071 -3.827 0 -9.239 -3.4443 0 -8.3151
  [4,16,-6.3639,0,-6.3639,-7.071,0,-7.071,-3.827,0,-9.239,-3.4443,0,-8.3151],
// 4 16 -3.4443 0 -8.3151 -3.827 0 -9.239 0 0 -10 0 0 -9
  [4,16,-3.4443,0,-8.3151,-3.827,0,-9.239,0,0,-10,0,0,-9],
// 4 16 0 0 -9 0 0 -10 3.827 0 -9.239 3.4443 0 -8.3151
  [4,16,0,0,-9,0,0,-10,3.827,0,-9.239,3.4443,0,-8.3151],
// 4 16 3.4443 0 -8.3151 3.827 0 -9.239 7.071 0 -7.071 6.3639 0 -6.3639
  [4,16,3.4443,0,-8.3151,3.827,0,-9.239,7.071,0,-7.071,6.3639,0,-6.3639],
// 4 16 6.3639 0 -6.3639 7.071 0 -7.071 9.239 0 -3.827 8.3151 0 -3.4443
  [4,16,6.3639,0,-6.3639,7.071,0,-7.071,9.239,0,-3.827,8.3151,0,-3.4443],
// 4 16 8.3151 0 -3.4443 9.239 0 -3.827 10 0 0 9 0 0
  [4,16,8.3151,0,-3.4443,9.239,0,-3.827,10,0,0,9,0,0],
// 0
];
module ldraw_lib__4_4ring9(step=0, col=false, unit=2/5, alt=false, line=0.2, solid=!$preview)
    makepoly(ldraw_lib__4_4ring9(), step=step, col=col, unit=unit, alt=alt, line=line, solid=solid);
ldraw_lib__4_4ring9(line=0.2);
// file: ../p/empty.scad
use <../lib.scad>
function ldraw_lib__empty() = [
// 0 Empty
// 0 Name: empty.dat
// 0 Author: Steffen [Steffen]
// 0 !LDRAW_ORG Primitive UPDATE 2015-01
// 0 !LICENSE Licensed under CC BY 4.0 : see CAreadme.txt
// 
// 0 BFC CERTIFY CCW
  [0,"BFC","CERTIFY"],
  [0,"BFC","CCW"],
// 
// 0 !HISTORY 2015-10-11 [PTadmin] Official Update 2015-01
// 
// 
// 0 // Tool MLCad cannot handle really empty files. This file is used as a workaround.
// 0 // It exceptionally contains forbidden non-LDRAW standard syntax to satisfy MLCad until it is fixed OR a different editor has become the de-facto LDRAW standard.
// 0 // The line being used here is an "impossible" conditional line which never should be visible,
// 0 // additionally hidden by a syntax explicitly hiding it from displaying.
// 
// 0 MLCAD HIDE 5 24 0 0 0 0.0001 0 0 0.0001 -0.0001 0 0 0 0
];
module ldraw_lib__empty(step=0, col=false, unit=2/5, alt=false, line=0.2, solid=!$preview)
    makepoly(ldraw_lib__empty(), step=step, col=col, unit=unit, alt=alt, line=line, solid=solid);
ldraw_lib__empty(line=0.2);
// file: s/98138s01.scad
use <../../lib.scad>
use <../../p/4-4ring9.scad>
use <98138s02.scad>
function ldraw_lib__s__98138s01() = [
// 0 ~Tile  1 x  1 Round with Groove with Partial Top Face
// 0 Name: s\98138s01.dat
// 0 Author: Magnus Forsberg [MagFors]
// 0 !LDRAW_ORG Subpart UPDATE 2020-01
// 0 !LICENSE Licensed under CC BY 4.0 : see CAreadme.txt
// 
// 0 BFC CERTIFY CCW
  [0,"BFC","CERTIFY"],
  [0,"BFC","CCW"],
// 
// 0 !HISTORY 2011-12-29 [PTadmin] Official Update 2011-02
// 0 !HISTORY 2016-06-17 [MagFors] Reduced the rounded edge to 0.5 ldu
// 0 !HISTORY 2016-12-31 [PTadmin] Official Update 2016-01
// 0 !HISTORY 2019-06-17 [MagFors] Removed the rounded edge
// 0 !HISTORY 2019-07-19 [MagFors] Subfiled without top surface
// 0 !HISTORY 2020-06-28 [PTadmin] Official Update 2020-01
// 
// 
// 1 16 0 0 0 1 0 0 0 1 0 0 0 1 s\98138s02.dat
  [1,16,0,0,0,1,0,0,0,1,0,0,0,1, ldraw_lib__s__98138s02()],
// 1 16 0 0 0 1 0 0 0 1 0 0 0 1 4-4ring9.dat
  [1,16,0,0,0,1,0,0,0,1,0,0,0,1, ldraw_lib__4_4ring9()],
];
module ldraw_lib__s__98138s01(step=0, col=false, unit=2/5, alt=false, line=0.2, solid=!$preview)
    makepoly(ldraw_lib__s__98138s01(), step=step, col=col, unit=unit, alt=alt, line=line, solid=solid);
ldraw_lib__s__98138s01(line=0.2);
// file: ../p/1-16chrd.scad
use <../lib.scad>
use <empty.scad>
function ldraw_lib__1_16chrd() = [
// 0 Chord 0.0625
// 0 Name: 1-16chrd.dat
// 0 Author: Philippe Hurbain [Philo]
// 0 !LDRAW_ORG Primitive UPDATE 2015-01
// 0 !LICENSE Licensed under CC BY 4.0 : see CAreadme.txt
// 
// 0 BFC CERTIFY CCW
  [0,"BFC","CERTIFY"],
  [0,"BFC","CCW"],
// 
// 0 !HISTORY 2015-10-11 [PTadmin] Official Update 2015-01
// 
// 
// 0 // This file is intentionally empty because at the current \P resolution,
// 0 // an 1-16chrd is actually empty. However, this file still is present
// 0 // to allow tools to do primitives substition and fill in a real chrd here,
// 0 // or, if desired, to substitute this with the hi-res 48\1-16chrd.
// 
// 0 // This file is based on an idea by Darats at http://forums.ldraw.org/read.php?19,14500,14500#msg-14500
// 
// 1 16 0 0 0 1 0 0 0 1 0 0 0 1 empty.dat
  [1,16,0,0,0,1,0,0,0,1,0,0,0,1, ldraw_lib__empty()],
];
module ldraw_lib__1_16chrd(step=0, col=false, unit=2/5, alt=false, line=0.2, solid=!$preview)
    makepoly(ldraw_lib__1_16chrd(), step=step, col=col, unit=unit, alt=alt, line=line, solid=solid);
ldraw_lib__1_16chrd(line=0.2);
// main file
use <../lib.scad>
use <../p/1-16chrd.scad>
use <s/98138s01.scad>
function ldraw_lib__98138px7() = [
// 0 Tile  1 x  1 Round with Yellow Square on Black and Blue Background Pattern
// 0 Name: 98138px7.dat
// 0 Author: Gerald Lasser [GeraldLasser]
// 0 !LDRAW_ORG Part UPDATE 2017-01
// 0 !LICENSE Licensed under CC BY 4.0 : see CAreadme.txt
// 
// 0 BFC CERTIFY CCW
  [0,"BFC","CERTIFY"],
  [0,"BFC","CCW"],
// 
// 0 !KEYWORDS BrickLink 98138pb078, clock, Minecraft
// 
// 0 !HISTORY 2017-12-30 [PTadmin] Official Update 2017-01
// 
// 
// 1 16 0 0 0 1 0 0 0 1 0 0 0 1 s\98138s01.dat
  [1,16,0,0,0,1,0,0,0,1,0,0,0,1, ldraw_lib__s__98138s01()],
// 1 16 0 0 0 9 0 0 0 1 0 0 0 9 1-16chrd.dat
  [1,16,0,0,0,9,0,0,0,1,0,0,0,9, ldraw_lib__1_16chrd()],
// 1 16 0 0 0 8.31492 0 3.44412 0 1 0 -3.44412 0 8.31492 1-16chrd.dat
  [1,16,0,0,0,8.31492,0,3.44412,0,1,0,-3.44412,0,8.31492, ldraw_lib__1_16chrd()],
// 1 16 0 0 0 6.36399 0 6.36399 0 1 0 -6.36399 0 6.36399 1-16chrd.dat
  [1,16,0,0,0,6.36399,0,6.36399,0,1,0,-6.36399,0,6.36399, ldraw_lib__1_16chrd()],
// 1 0 0 0 0 3.44412 0 8.31492 0 1 0 -8.31492 0 3.44412 1-16chrd.dat
  [1,0,0,0,0,3.44412,0,8.31492,0,1,0,-8.31492,0,3.44412, ldraw_lib__1_16chrd()],
// 1 0 0 0 0 0 0 9 0 1 0 -9 0 0 1-16chrd.dat
  [1,0,0,0,0,0,0,9,0,1,0,-9,0,0, ldraw_lib__1_16chrd()],
// 1 0 0 0 0 -3.44412 0 8.31492 0 1 0 -8.31492 0 -3.44412 1-16chrd.dat
  [1,0,0,0,0,-3.44412,0,8.31492,0,1,0,-8.31492,0,-3.44412, ldraw_lib__1_16chrd()],
// 1 0 0 0 0 -6.36399 0 6.36399 0 1 0 -6.36399 0 -6.36399 1-16chrd.dat
  [1,0,0,0,0,-6.36399,0,6.36399,0,1,0,-6.36399,0,-6.36399, ldraw_lib__1_16chrd()],
// 1 16 0 0 0 -8.31492 0 3.44412 0 1 0 -3.44412 0 -8.31492 1-16chrd.dat
  [1,16,0,0,0,-8.31492,0,3.44412,0,1,0,-3.44412,0,-8.31492, ldraw_lib__1_16chrd()],
// 1 1 0 0 0 0 0 -9 0 1 0 9 0 0 1-16chrd.dat
  [1,1,0,0,0,0,0,-9,0,1,0,9,0,0, ldraw_lib__1_16chrd()],
// 1 1 0 0 0 3.44412 0 -8.31492 0 1 0 8.31492 0 3.44412 1-16chrd.dat
  [1,1,0,0,0,3.44412,0,-8.31492,0,1,0,8.31492,0,3.44412, ldraw_lib__1_16chrd()],
// 1 16 0 0 0 6.36399 0 -6.36399 0 1 0 6.36399 0 6.36399 1-16chrd.dat
  [1,16,0,0,0,6.36399,0,-6.36399,0,1,0,6.36399,0,6.36399, ldraw_lib__1_16chrd()],
// 1 16 0 0 0 8.31492 0 -3.44412 0 1 0 3.44412 0 8.31492 1-16chrd.dat
  [1,16,0,0,0,8.31492,0,-3.44412,0,1,0,3.44412,0,8.31492, ldraw_lib__1_16chrd()],
// 1 1 0 0 0 -9 0 0 0 1 0 0 0 -9 1-16chrd.dat
  [1,1,0,0,0,-9,0,0,0,1,0,0,0,-9, ldraw_lib__1_16chrd()],
// 1 1 0 0 0 -8.31492 0 -3.44412 0 1 0 3.44412 0 -8.31492 1-16chrd.dat
  [1,1,0,0,0,-8.31492,0,-3.44412,0,1,0,3.44412,0,-8.31492, ldraw_lib__1_16chrd()],
// 1 1 0 0 0 -6.36399 0 -6.36399 0 1 0 6.36399 0 -6.36399 1-16chrd.dat
  [1,1,0,0,0,-6.36399,0,-6.36399,0,1,0,6.36399,0,-6.36399, ldraw_lib__1_16chrd()],
// 1 1 0 0 0 -3.44412 0 -8.31492 0 1 0 8.31492 0 -3.44412 1-16chrd.dat
  [1,1,0,0,0,-3.44412,0,-8.31492,0,1,0,8.31492,0,-3.44412, ldraw_lib__1_16chrd()],
// 4 14 0 0 0 0 0 5.4 -5.4 0 5.4 -5.4 0 0
  [4,14,0,0,0,0,0,5.4,-5.4,0,5.4,-5.4,0,0],
// 4 0 2.4 0 -0.3 0.2 0 -0.3 0.2 0 -3.1 3.5 0 -2.5
  [4,0,2.4,0,-0.3,0.2,0,-0.3,0.2,0,-3.1,3.5,0,-2.5],
// 4 0 2.4 0 -0.3 3.5 0 -2.5 3.5 0 1.9 2.4 0 3
  [4,0,2.4,0,-0.3,3.5,0,-2.5,3.5,0,1.9,2.4,0,3],
// 4 0 5.1 0 3 2.4 0 3 3.5 0 1.9 6.3639 0 1.8997
  [4,0,5.1,0,3,2.4,0,3,3.5,0,1.9,6.3639,0,1.8997],
// 4 0 0.2 0 -3.1 -2.6 0 -3.1 -2.6 0 -5.8 0 0 -9
  [4,0,0.2,0,-3.1,-2.6,0,-3.1,-2.6,0,-5.8,0,0,-9],
// 4 0 3.5 0 -2.5 0.2 0 -3.1 0 0 -9 3.4443 0 -8.3151
  [4,0,3.5,0,-2.5,0.2,0,-3.1,0,0,-9,3.4443,0,-8.3151],
// 4 0 6.3639 0 -2.4997 3.5 0 -2.5 3.4443 0 -8.3151 6.3639 0 -6.3639
  [4,0,6.3639,0,-2.4997,3.5,0,-2.5,3.4443,0,-8.3151,6.3639,0,-6.3639],
// 4 1 0 0 0 0.2 0 -0.3 2.4 0 -0.3 2.4 0 3
  [4,1,0,0,0,0.2,0,-0.3,2.4,0,-0.3,2.4,0,3],
// 3 1 0 0 5.4 0 0 0 2.4 0 3
  [3,1,0,0,5.4,0,0,0,2.4,0,3],
// 4 1 0 0 5.4 2.4 0 3 5.1 0 3 5.1 0 7.18
  [4,1,0,0,5.4,2.4,0,3,5.1,0,3,5.1,0,7.18],
// 4 1 0 0 5.4 5.1 0 7.18 0 0 9 -5.4 0 5.4
  [4,1,0,0,5.4,5.1,0,7.18,0,0,9,-5.4,0,5.4],
// 4 1 -5.4 0 0 -5.4 0 5.4 -9 0 0 -8.3151 0 -3.4443
  [4,1,-5.4,0,0,-5.4,0,5.4,-9,0,0,-8.3151,0,-3.4443],
// 4 1 -5.4 0 0 -8.3151 0 -3.4443 -6.71 0 -5.8 -2.6 0 -5.8
  [4,1,-5.4,0,0,-8.3151,0,-3.4443,-6.71,0,-5.8,-2.6,0,-5.8],
// 3 1 -5.4 0 0 -2.6 0 -5.8 -2.6 0 -3.1
  [3,1,-5.4,0,0,-2.6,0,-5.8,-2.6,0,-3.1],
// 4 1 0 0 0 -5.4 0 0 -2.6 0 -3.1 0.2 0 -0.3
  [4,1,0,0,0,-5.4,0,0,-2.6,0,-3.1,0.2,0,-0.3],
// 3 1 0.2 0 -0.3 -2.6 0 -3.1 0.2 0 -3.1
  [3,1,0.2,0,-0.3,-2.6,0,-3.1,0.2,0,-3.1],
// 4 1 -3.4443 0 8.3151 -6.3639 0 6.3639 -5.4 0 5.4 0 0 9
  [4,1,-3.4443,0,8.3151,-6.3639,0,6.3639,-5.4,0,5.4,0,0,9],
// 4 1 -5.4 0 5.4 -6.3639 0 6.3639 -8.3151 0 3.4443 -9 0 0
  [4,1,-5.4,0,5.4,-6.3639,0,6.3639,-8.3151,0,3.4443,-9,0,0],
// 4 16 3.5 0 1.9 3.5 0 -2.5 6.3639 0 -2.4997 6.3639 0 1.8997
  [4,16,3.5,0,1.9,3.5,0,-2.5,6.3639,0,-2.4997,6.3639,0,1.8997],
// 4 16 6.3639 0 1.8997 6.3639 0 -2.4997 9 0 0 8.3151 0 3.4443
  [4,16,6.3639,0,1.8997,6.3639,0,-2.4997,9,0,0,8.3151,0,3.4443],
// 4 16 8.3151 0 -3.4443 9 0 0 6.3639 0 -2.4997 6.3639 0 -6.3639
  [4,16,8.3151,0,-3.4443,9,0,0,6.3639,0,-2.4997,6.3639,0,-6.3639],
// 3 1 0 0 9 5.1 0 7.18 3.4443 0 8.3151
  [3,1,0,0,9,5.1,0,7.18,3.4443,0,8.3151],
// 4 0 5.1 0 3 6.3639 0 1.8997 6.3639 0 6.3639 5.1 0 7.18
  [4,0,5.1,0,3,6.3639,0,1.8997,6.3639,0,6.3639,5.1,0,7.18],
// 3 16 6.3639 0 6.3639 6.3639 0 1.8997 8.3151 0 3.4443
  [3,16,6.3639,0,6.3639,6.3639,0,1.8997,8.3151,0,3.4443],
// 3 16 3.4443 0 8.3151 5.1 0 7.18 6.3639 0 6.3639
  [3,16,3.4443,0,8.3151,5.1,0,7.18,6.3639,0,6.3639],
// 4 0 -3.4443 0 -8.3151 0 0 -9 -2.6 0 -5.8 -6.3639 0 -6.3639
  [4,0,-3.4443,0,-8.3151,0,0,-9,-2.6,0,-5.8,-6.3639,0,-6.3639],
// 3 0 -2.6 0 -5.8 -6.71 0 -5.8 -6.3639 0 -6.3639
  [3,0,-2.6,0,-5.8,-6.71,0,-5.8,-6.3639,0,-6.3639],
// 3 16 -8.3151 0 -3.4443 -6.3639 0 -6.3639 -6.71 0 -5.8
  [3,16,-8.3151,0,-3.4443,-6.3639,0,-6.3639,-6.71,0,-5.8],
];
module ldraw_lib__98138px7(step=0, col=false, unit=2/5, alt=false, line=0.2, solid=!$preview)
    makepoly(ldraw_lib__98138px7(), step=step, col=col, unit=unit, alt=alt, line=line, solid=solid);
ldraw_lib__98138px7(line=0.2);
